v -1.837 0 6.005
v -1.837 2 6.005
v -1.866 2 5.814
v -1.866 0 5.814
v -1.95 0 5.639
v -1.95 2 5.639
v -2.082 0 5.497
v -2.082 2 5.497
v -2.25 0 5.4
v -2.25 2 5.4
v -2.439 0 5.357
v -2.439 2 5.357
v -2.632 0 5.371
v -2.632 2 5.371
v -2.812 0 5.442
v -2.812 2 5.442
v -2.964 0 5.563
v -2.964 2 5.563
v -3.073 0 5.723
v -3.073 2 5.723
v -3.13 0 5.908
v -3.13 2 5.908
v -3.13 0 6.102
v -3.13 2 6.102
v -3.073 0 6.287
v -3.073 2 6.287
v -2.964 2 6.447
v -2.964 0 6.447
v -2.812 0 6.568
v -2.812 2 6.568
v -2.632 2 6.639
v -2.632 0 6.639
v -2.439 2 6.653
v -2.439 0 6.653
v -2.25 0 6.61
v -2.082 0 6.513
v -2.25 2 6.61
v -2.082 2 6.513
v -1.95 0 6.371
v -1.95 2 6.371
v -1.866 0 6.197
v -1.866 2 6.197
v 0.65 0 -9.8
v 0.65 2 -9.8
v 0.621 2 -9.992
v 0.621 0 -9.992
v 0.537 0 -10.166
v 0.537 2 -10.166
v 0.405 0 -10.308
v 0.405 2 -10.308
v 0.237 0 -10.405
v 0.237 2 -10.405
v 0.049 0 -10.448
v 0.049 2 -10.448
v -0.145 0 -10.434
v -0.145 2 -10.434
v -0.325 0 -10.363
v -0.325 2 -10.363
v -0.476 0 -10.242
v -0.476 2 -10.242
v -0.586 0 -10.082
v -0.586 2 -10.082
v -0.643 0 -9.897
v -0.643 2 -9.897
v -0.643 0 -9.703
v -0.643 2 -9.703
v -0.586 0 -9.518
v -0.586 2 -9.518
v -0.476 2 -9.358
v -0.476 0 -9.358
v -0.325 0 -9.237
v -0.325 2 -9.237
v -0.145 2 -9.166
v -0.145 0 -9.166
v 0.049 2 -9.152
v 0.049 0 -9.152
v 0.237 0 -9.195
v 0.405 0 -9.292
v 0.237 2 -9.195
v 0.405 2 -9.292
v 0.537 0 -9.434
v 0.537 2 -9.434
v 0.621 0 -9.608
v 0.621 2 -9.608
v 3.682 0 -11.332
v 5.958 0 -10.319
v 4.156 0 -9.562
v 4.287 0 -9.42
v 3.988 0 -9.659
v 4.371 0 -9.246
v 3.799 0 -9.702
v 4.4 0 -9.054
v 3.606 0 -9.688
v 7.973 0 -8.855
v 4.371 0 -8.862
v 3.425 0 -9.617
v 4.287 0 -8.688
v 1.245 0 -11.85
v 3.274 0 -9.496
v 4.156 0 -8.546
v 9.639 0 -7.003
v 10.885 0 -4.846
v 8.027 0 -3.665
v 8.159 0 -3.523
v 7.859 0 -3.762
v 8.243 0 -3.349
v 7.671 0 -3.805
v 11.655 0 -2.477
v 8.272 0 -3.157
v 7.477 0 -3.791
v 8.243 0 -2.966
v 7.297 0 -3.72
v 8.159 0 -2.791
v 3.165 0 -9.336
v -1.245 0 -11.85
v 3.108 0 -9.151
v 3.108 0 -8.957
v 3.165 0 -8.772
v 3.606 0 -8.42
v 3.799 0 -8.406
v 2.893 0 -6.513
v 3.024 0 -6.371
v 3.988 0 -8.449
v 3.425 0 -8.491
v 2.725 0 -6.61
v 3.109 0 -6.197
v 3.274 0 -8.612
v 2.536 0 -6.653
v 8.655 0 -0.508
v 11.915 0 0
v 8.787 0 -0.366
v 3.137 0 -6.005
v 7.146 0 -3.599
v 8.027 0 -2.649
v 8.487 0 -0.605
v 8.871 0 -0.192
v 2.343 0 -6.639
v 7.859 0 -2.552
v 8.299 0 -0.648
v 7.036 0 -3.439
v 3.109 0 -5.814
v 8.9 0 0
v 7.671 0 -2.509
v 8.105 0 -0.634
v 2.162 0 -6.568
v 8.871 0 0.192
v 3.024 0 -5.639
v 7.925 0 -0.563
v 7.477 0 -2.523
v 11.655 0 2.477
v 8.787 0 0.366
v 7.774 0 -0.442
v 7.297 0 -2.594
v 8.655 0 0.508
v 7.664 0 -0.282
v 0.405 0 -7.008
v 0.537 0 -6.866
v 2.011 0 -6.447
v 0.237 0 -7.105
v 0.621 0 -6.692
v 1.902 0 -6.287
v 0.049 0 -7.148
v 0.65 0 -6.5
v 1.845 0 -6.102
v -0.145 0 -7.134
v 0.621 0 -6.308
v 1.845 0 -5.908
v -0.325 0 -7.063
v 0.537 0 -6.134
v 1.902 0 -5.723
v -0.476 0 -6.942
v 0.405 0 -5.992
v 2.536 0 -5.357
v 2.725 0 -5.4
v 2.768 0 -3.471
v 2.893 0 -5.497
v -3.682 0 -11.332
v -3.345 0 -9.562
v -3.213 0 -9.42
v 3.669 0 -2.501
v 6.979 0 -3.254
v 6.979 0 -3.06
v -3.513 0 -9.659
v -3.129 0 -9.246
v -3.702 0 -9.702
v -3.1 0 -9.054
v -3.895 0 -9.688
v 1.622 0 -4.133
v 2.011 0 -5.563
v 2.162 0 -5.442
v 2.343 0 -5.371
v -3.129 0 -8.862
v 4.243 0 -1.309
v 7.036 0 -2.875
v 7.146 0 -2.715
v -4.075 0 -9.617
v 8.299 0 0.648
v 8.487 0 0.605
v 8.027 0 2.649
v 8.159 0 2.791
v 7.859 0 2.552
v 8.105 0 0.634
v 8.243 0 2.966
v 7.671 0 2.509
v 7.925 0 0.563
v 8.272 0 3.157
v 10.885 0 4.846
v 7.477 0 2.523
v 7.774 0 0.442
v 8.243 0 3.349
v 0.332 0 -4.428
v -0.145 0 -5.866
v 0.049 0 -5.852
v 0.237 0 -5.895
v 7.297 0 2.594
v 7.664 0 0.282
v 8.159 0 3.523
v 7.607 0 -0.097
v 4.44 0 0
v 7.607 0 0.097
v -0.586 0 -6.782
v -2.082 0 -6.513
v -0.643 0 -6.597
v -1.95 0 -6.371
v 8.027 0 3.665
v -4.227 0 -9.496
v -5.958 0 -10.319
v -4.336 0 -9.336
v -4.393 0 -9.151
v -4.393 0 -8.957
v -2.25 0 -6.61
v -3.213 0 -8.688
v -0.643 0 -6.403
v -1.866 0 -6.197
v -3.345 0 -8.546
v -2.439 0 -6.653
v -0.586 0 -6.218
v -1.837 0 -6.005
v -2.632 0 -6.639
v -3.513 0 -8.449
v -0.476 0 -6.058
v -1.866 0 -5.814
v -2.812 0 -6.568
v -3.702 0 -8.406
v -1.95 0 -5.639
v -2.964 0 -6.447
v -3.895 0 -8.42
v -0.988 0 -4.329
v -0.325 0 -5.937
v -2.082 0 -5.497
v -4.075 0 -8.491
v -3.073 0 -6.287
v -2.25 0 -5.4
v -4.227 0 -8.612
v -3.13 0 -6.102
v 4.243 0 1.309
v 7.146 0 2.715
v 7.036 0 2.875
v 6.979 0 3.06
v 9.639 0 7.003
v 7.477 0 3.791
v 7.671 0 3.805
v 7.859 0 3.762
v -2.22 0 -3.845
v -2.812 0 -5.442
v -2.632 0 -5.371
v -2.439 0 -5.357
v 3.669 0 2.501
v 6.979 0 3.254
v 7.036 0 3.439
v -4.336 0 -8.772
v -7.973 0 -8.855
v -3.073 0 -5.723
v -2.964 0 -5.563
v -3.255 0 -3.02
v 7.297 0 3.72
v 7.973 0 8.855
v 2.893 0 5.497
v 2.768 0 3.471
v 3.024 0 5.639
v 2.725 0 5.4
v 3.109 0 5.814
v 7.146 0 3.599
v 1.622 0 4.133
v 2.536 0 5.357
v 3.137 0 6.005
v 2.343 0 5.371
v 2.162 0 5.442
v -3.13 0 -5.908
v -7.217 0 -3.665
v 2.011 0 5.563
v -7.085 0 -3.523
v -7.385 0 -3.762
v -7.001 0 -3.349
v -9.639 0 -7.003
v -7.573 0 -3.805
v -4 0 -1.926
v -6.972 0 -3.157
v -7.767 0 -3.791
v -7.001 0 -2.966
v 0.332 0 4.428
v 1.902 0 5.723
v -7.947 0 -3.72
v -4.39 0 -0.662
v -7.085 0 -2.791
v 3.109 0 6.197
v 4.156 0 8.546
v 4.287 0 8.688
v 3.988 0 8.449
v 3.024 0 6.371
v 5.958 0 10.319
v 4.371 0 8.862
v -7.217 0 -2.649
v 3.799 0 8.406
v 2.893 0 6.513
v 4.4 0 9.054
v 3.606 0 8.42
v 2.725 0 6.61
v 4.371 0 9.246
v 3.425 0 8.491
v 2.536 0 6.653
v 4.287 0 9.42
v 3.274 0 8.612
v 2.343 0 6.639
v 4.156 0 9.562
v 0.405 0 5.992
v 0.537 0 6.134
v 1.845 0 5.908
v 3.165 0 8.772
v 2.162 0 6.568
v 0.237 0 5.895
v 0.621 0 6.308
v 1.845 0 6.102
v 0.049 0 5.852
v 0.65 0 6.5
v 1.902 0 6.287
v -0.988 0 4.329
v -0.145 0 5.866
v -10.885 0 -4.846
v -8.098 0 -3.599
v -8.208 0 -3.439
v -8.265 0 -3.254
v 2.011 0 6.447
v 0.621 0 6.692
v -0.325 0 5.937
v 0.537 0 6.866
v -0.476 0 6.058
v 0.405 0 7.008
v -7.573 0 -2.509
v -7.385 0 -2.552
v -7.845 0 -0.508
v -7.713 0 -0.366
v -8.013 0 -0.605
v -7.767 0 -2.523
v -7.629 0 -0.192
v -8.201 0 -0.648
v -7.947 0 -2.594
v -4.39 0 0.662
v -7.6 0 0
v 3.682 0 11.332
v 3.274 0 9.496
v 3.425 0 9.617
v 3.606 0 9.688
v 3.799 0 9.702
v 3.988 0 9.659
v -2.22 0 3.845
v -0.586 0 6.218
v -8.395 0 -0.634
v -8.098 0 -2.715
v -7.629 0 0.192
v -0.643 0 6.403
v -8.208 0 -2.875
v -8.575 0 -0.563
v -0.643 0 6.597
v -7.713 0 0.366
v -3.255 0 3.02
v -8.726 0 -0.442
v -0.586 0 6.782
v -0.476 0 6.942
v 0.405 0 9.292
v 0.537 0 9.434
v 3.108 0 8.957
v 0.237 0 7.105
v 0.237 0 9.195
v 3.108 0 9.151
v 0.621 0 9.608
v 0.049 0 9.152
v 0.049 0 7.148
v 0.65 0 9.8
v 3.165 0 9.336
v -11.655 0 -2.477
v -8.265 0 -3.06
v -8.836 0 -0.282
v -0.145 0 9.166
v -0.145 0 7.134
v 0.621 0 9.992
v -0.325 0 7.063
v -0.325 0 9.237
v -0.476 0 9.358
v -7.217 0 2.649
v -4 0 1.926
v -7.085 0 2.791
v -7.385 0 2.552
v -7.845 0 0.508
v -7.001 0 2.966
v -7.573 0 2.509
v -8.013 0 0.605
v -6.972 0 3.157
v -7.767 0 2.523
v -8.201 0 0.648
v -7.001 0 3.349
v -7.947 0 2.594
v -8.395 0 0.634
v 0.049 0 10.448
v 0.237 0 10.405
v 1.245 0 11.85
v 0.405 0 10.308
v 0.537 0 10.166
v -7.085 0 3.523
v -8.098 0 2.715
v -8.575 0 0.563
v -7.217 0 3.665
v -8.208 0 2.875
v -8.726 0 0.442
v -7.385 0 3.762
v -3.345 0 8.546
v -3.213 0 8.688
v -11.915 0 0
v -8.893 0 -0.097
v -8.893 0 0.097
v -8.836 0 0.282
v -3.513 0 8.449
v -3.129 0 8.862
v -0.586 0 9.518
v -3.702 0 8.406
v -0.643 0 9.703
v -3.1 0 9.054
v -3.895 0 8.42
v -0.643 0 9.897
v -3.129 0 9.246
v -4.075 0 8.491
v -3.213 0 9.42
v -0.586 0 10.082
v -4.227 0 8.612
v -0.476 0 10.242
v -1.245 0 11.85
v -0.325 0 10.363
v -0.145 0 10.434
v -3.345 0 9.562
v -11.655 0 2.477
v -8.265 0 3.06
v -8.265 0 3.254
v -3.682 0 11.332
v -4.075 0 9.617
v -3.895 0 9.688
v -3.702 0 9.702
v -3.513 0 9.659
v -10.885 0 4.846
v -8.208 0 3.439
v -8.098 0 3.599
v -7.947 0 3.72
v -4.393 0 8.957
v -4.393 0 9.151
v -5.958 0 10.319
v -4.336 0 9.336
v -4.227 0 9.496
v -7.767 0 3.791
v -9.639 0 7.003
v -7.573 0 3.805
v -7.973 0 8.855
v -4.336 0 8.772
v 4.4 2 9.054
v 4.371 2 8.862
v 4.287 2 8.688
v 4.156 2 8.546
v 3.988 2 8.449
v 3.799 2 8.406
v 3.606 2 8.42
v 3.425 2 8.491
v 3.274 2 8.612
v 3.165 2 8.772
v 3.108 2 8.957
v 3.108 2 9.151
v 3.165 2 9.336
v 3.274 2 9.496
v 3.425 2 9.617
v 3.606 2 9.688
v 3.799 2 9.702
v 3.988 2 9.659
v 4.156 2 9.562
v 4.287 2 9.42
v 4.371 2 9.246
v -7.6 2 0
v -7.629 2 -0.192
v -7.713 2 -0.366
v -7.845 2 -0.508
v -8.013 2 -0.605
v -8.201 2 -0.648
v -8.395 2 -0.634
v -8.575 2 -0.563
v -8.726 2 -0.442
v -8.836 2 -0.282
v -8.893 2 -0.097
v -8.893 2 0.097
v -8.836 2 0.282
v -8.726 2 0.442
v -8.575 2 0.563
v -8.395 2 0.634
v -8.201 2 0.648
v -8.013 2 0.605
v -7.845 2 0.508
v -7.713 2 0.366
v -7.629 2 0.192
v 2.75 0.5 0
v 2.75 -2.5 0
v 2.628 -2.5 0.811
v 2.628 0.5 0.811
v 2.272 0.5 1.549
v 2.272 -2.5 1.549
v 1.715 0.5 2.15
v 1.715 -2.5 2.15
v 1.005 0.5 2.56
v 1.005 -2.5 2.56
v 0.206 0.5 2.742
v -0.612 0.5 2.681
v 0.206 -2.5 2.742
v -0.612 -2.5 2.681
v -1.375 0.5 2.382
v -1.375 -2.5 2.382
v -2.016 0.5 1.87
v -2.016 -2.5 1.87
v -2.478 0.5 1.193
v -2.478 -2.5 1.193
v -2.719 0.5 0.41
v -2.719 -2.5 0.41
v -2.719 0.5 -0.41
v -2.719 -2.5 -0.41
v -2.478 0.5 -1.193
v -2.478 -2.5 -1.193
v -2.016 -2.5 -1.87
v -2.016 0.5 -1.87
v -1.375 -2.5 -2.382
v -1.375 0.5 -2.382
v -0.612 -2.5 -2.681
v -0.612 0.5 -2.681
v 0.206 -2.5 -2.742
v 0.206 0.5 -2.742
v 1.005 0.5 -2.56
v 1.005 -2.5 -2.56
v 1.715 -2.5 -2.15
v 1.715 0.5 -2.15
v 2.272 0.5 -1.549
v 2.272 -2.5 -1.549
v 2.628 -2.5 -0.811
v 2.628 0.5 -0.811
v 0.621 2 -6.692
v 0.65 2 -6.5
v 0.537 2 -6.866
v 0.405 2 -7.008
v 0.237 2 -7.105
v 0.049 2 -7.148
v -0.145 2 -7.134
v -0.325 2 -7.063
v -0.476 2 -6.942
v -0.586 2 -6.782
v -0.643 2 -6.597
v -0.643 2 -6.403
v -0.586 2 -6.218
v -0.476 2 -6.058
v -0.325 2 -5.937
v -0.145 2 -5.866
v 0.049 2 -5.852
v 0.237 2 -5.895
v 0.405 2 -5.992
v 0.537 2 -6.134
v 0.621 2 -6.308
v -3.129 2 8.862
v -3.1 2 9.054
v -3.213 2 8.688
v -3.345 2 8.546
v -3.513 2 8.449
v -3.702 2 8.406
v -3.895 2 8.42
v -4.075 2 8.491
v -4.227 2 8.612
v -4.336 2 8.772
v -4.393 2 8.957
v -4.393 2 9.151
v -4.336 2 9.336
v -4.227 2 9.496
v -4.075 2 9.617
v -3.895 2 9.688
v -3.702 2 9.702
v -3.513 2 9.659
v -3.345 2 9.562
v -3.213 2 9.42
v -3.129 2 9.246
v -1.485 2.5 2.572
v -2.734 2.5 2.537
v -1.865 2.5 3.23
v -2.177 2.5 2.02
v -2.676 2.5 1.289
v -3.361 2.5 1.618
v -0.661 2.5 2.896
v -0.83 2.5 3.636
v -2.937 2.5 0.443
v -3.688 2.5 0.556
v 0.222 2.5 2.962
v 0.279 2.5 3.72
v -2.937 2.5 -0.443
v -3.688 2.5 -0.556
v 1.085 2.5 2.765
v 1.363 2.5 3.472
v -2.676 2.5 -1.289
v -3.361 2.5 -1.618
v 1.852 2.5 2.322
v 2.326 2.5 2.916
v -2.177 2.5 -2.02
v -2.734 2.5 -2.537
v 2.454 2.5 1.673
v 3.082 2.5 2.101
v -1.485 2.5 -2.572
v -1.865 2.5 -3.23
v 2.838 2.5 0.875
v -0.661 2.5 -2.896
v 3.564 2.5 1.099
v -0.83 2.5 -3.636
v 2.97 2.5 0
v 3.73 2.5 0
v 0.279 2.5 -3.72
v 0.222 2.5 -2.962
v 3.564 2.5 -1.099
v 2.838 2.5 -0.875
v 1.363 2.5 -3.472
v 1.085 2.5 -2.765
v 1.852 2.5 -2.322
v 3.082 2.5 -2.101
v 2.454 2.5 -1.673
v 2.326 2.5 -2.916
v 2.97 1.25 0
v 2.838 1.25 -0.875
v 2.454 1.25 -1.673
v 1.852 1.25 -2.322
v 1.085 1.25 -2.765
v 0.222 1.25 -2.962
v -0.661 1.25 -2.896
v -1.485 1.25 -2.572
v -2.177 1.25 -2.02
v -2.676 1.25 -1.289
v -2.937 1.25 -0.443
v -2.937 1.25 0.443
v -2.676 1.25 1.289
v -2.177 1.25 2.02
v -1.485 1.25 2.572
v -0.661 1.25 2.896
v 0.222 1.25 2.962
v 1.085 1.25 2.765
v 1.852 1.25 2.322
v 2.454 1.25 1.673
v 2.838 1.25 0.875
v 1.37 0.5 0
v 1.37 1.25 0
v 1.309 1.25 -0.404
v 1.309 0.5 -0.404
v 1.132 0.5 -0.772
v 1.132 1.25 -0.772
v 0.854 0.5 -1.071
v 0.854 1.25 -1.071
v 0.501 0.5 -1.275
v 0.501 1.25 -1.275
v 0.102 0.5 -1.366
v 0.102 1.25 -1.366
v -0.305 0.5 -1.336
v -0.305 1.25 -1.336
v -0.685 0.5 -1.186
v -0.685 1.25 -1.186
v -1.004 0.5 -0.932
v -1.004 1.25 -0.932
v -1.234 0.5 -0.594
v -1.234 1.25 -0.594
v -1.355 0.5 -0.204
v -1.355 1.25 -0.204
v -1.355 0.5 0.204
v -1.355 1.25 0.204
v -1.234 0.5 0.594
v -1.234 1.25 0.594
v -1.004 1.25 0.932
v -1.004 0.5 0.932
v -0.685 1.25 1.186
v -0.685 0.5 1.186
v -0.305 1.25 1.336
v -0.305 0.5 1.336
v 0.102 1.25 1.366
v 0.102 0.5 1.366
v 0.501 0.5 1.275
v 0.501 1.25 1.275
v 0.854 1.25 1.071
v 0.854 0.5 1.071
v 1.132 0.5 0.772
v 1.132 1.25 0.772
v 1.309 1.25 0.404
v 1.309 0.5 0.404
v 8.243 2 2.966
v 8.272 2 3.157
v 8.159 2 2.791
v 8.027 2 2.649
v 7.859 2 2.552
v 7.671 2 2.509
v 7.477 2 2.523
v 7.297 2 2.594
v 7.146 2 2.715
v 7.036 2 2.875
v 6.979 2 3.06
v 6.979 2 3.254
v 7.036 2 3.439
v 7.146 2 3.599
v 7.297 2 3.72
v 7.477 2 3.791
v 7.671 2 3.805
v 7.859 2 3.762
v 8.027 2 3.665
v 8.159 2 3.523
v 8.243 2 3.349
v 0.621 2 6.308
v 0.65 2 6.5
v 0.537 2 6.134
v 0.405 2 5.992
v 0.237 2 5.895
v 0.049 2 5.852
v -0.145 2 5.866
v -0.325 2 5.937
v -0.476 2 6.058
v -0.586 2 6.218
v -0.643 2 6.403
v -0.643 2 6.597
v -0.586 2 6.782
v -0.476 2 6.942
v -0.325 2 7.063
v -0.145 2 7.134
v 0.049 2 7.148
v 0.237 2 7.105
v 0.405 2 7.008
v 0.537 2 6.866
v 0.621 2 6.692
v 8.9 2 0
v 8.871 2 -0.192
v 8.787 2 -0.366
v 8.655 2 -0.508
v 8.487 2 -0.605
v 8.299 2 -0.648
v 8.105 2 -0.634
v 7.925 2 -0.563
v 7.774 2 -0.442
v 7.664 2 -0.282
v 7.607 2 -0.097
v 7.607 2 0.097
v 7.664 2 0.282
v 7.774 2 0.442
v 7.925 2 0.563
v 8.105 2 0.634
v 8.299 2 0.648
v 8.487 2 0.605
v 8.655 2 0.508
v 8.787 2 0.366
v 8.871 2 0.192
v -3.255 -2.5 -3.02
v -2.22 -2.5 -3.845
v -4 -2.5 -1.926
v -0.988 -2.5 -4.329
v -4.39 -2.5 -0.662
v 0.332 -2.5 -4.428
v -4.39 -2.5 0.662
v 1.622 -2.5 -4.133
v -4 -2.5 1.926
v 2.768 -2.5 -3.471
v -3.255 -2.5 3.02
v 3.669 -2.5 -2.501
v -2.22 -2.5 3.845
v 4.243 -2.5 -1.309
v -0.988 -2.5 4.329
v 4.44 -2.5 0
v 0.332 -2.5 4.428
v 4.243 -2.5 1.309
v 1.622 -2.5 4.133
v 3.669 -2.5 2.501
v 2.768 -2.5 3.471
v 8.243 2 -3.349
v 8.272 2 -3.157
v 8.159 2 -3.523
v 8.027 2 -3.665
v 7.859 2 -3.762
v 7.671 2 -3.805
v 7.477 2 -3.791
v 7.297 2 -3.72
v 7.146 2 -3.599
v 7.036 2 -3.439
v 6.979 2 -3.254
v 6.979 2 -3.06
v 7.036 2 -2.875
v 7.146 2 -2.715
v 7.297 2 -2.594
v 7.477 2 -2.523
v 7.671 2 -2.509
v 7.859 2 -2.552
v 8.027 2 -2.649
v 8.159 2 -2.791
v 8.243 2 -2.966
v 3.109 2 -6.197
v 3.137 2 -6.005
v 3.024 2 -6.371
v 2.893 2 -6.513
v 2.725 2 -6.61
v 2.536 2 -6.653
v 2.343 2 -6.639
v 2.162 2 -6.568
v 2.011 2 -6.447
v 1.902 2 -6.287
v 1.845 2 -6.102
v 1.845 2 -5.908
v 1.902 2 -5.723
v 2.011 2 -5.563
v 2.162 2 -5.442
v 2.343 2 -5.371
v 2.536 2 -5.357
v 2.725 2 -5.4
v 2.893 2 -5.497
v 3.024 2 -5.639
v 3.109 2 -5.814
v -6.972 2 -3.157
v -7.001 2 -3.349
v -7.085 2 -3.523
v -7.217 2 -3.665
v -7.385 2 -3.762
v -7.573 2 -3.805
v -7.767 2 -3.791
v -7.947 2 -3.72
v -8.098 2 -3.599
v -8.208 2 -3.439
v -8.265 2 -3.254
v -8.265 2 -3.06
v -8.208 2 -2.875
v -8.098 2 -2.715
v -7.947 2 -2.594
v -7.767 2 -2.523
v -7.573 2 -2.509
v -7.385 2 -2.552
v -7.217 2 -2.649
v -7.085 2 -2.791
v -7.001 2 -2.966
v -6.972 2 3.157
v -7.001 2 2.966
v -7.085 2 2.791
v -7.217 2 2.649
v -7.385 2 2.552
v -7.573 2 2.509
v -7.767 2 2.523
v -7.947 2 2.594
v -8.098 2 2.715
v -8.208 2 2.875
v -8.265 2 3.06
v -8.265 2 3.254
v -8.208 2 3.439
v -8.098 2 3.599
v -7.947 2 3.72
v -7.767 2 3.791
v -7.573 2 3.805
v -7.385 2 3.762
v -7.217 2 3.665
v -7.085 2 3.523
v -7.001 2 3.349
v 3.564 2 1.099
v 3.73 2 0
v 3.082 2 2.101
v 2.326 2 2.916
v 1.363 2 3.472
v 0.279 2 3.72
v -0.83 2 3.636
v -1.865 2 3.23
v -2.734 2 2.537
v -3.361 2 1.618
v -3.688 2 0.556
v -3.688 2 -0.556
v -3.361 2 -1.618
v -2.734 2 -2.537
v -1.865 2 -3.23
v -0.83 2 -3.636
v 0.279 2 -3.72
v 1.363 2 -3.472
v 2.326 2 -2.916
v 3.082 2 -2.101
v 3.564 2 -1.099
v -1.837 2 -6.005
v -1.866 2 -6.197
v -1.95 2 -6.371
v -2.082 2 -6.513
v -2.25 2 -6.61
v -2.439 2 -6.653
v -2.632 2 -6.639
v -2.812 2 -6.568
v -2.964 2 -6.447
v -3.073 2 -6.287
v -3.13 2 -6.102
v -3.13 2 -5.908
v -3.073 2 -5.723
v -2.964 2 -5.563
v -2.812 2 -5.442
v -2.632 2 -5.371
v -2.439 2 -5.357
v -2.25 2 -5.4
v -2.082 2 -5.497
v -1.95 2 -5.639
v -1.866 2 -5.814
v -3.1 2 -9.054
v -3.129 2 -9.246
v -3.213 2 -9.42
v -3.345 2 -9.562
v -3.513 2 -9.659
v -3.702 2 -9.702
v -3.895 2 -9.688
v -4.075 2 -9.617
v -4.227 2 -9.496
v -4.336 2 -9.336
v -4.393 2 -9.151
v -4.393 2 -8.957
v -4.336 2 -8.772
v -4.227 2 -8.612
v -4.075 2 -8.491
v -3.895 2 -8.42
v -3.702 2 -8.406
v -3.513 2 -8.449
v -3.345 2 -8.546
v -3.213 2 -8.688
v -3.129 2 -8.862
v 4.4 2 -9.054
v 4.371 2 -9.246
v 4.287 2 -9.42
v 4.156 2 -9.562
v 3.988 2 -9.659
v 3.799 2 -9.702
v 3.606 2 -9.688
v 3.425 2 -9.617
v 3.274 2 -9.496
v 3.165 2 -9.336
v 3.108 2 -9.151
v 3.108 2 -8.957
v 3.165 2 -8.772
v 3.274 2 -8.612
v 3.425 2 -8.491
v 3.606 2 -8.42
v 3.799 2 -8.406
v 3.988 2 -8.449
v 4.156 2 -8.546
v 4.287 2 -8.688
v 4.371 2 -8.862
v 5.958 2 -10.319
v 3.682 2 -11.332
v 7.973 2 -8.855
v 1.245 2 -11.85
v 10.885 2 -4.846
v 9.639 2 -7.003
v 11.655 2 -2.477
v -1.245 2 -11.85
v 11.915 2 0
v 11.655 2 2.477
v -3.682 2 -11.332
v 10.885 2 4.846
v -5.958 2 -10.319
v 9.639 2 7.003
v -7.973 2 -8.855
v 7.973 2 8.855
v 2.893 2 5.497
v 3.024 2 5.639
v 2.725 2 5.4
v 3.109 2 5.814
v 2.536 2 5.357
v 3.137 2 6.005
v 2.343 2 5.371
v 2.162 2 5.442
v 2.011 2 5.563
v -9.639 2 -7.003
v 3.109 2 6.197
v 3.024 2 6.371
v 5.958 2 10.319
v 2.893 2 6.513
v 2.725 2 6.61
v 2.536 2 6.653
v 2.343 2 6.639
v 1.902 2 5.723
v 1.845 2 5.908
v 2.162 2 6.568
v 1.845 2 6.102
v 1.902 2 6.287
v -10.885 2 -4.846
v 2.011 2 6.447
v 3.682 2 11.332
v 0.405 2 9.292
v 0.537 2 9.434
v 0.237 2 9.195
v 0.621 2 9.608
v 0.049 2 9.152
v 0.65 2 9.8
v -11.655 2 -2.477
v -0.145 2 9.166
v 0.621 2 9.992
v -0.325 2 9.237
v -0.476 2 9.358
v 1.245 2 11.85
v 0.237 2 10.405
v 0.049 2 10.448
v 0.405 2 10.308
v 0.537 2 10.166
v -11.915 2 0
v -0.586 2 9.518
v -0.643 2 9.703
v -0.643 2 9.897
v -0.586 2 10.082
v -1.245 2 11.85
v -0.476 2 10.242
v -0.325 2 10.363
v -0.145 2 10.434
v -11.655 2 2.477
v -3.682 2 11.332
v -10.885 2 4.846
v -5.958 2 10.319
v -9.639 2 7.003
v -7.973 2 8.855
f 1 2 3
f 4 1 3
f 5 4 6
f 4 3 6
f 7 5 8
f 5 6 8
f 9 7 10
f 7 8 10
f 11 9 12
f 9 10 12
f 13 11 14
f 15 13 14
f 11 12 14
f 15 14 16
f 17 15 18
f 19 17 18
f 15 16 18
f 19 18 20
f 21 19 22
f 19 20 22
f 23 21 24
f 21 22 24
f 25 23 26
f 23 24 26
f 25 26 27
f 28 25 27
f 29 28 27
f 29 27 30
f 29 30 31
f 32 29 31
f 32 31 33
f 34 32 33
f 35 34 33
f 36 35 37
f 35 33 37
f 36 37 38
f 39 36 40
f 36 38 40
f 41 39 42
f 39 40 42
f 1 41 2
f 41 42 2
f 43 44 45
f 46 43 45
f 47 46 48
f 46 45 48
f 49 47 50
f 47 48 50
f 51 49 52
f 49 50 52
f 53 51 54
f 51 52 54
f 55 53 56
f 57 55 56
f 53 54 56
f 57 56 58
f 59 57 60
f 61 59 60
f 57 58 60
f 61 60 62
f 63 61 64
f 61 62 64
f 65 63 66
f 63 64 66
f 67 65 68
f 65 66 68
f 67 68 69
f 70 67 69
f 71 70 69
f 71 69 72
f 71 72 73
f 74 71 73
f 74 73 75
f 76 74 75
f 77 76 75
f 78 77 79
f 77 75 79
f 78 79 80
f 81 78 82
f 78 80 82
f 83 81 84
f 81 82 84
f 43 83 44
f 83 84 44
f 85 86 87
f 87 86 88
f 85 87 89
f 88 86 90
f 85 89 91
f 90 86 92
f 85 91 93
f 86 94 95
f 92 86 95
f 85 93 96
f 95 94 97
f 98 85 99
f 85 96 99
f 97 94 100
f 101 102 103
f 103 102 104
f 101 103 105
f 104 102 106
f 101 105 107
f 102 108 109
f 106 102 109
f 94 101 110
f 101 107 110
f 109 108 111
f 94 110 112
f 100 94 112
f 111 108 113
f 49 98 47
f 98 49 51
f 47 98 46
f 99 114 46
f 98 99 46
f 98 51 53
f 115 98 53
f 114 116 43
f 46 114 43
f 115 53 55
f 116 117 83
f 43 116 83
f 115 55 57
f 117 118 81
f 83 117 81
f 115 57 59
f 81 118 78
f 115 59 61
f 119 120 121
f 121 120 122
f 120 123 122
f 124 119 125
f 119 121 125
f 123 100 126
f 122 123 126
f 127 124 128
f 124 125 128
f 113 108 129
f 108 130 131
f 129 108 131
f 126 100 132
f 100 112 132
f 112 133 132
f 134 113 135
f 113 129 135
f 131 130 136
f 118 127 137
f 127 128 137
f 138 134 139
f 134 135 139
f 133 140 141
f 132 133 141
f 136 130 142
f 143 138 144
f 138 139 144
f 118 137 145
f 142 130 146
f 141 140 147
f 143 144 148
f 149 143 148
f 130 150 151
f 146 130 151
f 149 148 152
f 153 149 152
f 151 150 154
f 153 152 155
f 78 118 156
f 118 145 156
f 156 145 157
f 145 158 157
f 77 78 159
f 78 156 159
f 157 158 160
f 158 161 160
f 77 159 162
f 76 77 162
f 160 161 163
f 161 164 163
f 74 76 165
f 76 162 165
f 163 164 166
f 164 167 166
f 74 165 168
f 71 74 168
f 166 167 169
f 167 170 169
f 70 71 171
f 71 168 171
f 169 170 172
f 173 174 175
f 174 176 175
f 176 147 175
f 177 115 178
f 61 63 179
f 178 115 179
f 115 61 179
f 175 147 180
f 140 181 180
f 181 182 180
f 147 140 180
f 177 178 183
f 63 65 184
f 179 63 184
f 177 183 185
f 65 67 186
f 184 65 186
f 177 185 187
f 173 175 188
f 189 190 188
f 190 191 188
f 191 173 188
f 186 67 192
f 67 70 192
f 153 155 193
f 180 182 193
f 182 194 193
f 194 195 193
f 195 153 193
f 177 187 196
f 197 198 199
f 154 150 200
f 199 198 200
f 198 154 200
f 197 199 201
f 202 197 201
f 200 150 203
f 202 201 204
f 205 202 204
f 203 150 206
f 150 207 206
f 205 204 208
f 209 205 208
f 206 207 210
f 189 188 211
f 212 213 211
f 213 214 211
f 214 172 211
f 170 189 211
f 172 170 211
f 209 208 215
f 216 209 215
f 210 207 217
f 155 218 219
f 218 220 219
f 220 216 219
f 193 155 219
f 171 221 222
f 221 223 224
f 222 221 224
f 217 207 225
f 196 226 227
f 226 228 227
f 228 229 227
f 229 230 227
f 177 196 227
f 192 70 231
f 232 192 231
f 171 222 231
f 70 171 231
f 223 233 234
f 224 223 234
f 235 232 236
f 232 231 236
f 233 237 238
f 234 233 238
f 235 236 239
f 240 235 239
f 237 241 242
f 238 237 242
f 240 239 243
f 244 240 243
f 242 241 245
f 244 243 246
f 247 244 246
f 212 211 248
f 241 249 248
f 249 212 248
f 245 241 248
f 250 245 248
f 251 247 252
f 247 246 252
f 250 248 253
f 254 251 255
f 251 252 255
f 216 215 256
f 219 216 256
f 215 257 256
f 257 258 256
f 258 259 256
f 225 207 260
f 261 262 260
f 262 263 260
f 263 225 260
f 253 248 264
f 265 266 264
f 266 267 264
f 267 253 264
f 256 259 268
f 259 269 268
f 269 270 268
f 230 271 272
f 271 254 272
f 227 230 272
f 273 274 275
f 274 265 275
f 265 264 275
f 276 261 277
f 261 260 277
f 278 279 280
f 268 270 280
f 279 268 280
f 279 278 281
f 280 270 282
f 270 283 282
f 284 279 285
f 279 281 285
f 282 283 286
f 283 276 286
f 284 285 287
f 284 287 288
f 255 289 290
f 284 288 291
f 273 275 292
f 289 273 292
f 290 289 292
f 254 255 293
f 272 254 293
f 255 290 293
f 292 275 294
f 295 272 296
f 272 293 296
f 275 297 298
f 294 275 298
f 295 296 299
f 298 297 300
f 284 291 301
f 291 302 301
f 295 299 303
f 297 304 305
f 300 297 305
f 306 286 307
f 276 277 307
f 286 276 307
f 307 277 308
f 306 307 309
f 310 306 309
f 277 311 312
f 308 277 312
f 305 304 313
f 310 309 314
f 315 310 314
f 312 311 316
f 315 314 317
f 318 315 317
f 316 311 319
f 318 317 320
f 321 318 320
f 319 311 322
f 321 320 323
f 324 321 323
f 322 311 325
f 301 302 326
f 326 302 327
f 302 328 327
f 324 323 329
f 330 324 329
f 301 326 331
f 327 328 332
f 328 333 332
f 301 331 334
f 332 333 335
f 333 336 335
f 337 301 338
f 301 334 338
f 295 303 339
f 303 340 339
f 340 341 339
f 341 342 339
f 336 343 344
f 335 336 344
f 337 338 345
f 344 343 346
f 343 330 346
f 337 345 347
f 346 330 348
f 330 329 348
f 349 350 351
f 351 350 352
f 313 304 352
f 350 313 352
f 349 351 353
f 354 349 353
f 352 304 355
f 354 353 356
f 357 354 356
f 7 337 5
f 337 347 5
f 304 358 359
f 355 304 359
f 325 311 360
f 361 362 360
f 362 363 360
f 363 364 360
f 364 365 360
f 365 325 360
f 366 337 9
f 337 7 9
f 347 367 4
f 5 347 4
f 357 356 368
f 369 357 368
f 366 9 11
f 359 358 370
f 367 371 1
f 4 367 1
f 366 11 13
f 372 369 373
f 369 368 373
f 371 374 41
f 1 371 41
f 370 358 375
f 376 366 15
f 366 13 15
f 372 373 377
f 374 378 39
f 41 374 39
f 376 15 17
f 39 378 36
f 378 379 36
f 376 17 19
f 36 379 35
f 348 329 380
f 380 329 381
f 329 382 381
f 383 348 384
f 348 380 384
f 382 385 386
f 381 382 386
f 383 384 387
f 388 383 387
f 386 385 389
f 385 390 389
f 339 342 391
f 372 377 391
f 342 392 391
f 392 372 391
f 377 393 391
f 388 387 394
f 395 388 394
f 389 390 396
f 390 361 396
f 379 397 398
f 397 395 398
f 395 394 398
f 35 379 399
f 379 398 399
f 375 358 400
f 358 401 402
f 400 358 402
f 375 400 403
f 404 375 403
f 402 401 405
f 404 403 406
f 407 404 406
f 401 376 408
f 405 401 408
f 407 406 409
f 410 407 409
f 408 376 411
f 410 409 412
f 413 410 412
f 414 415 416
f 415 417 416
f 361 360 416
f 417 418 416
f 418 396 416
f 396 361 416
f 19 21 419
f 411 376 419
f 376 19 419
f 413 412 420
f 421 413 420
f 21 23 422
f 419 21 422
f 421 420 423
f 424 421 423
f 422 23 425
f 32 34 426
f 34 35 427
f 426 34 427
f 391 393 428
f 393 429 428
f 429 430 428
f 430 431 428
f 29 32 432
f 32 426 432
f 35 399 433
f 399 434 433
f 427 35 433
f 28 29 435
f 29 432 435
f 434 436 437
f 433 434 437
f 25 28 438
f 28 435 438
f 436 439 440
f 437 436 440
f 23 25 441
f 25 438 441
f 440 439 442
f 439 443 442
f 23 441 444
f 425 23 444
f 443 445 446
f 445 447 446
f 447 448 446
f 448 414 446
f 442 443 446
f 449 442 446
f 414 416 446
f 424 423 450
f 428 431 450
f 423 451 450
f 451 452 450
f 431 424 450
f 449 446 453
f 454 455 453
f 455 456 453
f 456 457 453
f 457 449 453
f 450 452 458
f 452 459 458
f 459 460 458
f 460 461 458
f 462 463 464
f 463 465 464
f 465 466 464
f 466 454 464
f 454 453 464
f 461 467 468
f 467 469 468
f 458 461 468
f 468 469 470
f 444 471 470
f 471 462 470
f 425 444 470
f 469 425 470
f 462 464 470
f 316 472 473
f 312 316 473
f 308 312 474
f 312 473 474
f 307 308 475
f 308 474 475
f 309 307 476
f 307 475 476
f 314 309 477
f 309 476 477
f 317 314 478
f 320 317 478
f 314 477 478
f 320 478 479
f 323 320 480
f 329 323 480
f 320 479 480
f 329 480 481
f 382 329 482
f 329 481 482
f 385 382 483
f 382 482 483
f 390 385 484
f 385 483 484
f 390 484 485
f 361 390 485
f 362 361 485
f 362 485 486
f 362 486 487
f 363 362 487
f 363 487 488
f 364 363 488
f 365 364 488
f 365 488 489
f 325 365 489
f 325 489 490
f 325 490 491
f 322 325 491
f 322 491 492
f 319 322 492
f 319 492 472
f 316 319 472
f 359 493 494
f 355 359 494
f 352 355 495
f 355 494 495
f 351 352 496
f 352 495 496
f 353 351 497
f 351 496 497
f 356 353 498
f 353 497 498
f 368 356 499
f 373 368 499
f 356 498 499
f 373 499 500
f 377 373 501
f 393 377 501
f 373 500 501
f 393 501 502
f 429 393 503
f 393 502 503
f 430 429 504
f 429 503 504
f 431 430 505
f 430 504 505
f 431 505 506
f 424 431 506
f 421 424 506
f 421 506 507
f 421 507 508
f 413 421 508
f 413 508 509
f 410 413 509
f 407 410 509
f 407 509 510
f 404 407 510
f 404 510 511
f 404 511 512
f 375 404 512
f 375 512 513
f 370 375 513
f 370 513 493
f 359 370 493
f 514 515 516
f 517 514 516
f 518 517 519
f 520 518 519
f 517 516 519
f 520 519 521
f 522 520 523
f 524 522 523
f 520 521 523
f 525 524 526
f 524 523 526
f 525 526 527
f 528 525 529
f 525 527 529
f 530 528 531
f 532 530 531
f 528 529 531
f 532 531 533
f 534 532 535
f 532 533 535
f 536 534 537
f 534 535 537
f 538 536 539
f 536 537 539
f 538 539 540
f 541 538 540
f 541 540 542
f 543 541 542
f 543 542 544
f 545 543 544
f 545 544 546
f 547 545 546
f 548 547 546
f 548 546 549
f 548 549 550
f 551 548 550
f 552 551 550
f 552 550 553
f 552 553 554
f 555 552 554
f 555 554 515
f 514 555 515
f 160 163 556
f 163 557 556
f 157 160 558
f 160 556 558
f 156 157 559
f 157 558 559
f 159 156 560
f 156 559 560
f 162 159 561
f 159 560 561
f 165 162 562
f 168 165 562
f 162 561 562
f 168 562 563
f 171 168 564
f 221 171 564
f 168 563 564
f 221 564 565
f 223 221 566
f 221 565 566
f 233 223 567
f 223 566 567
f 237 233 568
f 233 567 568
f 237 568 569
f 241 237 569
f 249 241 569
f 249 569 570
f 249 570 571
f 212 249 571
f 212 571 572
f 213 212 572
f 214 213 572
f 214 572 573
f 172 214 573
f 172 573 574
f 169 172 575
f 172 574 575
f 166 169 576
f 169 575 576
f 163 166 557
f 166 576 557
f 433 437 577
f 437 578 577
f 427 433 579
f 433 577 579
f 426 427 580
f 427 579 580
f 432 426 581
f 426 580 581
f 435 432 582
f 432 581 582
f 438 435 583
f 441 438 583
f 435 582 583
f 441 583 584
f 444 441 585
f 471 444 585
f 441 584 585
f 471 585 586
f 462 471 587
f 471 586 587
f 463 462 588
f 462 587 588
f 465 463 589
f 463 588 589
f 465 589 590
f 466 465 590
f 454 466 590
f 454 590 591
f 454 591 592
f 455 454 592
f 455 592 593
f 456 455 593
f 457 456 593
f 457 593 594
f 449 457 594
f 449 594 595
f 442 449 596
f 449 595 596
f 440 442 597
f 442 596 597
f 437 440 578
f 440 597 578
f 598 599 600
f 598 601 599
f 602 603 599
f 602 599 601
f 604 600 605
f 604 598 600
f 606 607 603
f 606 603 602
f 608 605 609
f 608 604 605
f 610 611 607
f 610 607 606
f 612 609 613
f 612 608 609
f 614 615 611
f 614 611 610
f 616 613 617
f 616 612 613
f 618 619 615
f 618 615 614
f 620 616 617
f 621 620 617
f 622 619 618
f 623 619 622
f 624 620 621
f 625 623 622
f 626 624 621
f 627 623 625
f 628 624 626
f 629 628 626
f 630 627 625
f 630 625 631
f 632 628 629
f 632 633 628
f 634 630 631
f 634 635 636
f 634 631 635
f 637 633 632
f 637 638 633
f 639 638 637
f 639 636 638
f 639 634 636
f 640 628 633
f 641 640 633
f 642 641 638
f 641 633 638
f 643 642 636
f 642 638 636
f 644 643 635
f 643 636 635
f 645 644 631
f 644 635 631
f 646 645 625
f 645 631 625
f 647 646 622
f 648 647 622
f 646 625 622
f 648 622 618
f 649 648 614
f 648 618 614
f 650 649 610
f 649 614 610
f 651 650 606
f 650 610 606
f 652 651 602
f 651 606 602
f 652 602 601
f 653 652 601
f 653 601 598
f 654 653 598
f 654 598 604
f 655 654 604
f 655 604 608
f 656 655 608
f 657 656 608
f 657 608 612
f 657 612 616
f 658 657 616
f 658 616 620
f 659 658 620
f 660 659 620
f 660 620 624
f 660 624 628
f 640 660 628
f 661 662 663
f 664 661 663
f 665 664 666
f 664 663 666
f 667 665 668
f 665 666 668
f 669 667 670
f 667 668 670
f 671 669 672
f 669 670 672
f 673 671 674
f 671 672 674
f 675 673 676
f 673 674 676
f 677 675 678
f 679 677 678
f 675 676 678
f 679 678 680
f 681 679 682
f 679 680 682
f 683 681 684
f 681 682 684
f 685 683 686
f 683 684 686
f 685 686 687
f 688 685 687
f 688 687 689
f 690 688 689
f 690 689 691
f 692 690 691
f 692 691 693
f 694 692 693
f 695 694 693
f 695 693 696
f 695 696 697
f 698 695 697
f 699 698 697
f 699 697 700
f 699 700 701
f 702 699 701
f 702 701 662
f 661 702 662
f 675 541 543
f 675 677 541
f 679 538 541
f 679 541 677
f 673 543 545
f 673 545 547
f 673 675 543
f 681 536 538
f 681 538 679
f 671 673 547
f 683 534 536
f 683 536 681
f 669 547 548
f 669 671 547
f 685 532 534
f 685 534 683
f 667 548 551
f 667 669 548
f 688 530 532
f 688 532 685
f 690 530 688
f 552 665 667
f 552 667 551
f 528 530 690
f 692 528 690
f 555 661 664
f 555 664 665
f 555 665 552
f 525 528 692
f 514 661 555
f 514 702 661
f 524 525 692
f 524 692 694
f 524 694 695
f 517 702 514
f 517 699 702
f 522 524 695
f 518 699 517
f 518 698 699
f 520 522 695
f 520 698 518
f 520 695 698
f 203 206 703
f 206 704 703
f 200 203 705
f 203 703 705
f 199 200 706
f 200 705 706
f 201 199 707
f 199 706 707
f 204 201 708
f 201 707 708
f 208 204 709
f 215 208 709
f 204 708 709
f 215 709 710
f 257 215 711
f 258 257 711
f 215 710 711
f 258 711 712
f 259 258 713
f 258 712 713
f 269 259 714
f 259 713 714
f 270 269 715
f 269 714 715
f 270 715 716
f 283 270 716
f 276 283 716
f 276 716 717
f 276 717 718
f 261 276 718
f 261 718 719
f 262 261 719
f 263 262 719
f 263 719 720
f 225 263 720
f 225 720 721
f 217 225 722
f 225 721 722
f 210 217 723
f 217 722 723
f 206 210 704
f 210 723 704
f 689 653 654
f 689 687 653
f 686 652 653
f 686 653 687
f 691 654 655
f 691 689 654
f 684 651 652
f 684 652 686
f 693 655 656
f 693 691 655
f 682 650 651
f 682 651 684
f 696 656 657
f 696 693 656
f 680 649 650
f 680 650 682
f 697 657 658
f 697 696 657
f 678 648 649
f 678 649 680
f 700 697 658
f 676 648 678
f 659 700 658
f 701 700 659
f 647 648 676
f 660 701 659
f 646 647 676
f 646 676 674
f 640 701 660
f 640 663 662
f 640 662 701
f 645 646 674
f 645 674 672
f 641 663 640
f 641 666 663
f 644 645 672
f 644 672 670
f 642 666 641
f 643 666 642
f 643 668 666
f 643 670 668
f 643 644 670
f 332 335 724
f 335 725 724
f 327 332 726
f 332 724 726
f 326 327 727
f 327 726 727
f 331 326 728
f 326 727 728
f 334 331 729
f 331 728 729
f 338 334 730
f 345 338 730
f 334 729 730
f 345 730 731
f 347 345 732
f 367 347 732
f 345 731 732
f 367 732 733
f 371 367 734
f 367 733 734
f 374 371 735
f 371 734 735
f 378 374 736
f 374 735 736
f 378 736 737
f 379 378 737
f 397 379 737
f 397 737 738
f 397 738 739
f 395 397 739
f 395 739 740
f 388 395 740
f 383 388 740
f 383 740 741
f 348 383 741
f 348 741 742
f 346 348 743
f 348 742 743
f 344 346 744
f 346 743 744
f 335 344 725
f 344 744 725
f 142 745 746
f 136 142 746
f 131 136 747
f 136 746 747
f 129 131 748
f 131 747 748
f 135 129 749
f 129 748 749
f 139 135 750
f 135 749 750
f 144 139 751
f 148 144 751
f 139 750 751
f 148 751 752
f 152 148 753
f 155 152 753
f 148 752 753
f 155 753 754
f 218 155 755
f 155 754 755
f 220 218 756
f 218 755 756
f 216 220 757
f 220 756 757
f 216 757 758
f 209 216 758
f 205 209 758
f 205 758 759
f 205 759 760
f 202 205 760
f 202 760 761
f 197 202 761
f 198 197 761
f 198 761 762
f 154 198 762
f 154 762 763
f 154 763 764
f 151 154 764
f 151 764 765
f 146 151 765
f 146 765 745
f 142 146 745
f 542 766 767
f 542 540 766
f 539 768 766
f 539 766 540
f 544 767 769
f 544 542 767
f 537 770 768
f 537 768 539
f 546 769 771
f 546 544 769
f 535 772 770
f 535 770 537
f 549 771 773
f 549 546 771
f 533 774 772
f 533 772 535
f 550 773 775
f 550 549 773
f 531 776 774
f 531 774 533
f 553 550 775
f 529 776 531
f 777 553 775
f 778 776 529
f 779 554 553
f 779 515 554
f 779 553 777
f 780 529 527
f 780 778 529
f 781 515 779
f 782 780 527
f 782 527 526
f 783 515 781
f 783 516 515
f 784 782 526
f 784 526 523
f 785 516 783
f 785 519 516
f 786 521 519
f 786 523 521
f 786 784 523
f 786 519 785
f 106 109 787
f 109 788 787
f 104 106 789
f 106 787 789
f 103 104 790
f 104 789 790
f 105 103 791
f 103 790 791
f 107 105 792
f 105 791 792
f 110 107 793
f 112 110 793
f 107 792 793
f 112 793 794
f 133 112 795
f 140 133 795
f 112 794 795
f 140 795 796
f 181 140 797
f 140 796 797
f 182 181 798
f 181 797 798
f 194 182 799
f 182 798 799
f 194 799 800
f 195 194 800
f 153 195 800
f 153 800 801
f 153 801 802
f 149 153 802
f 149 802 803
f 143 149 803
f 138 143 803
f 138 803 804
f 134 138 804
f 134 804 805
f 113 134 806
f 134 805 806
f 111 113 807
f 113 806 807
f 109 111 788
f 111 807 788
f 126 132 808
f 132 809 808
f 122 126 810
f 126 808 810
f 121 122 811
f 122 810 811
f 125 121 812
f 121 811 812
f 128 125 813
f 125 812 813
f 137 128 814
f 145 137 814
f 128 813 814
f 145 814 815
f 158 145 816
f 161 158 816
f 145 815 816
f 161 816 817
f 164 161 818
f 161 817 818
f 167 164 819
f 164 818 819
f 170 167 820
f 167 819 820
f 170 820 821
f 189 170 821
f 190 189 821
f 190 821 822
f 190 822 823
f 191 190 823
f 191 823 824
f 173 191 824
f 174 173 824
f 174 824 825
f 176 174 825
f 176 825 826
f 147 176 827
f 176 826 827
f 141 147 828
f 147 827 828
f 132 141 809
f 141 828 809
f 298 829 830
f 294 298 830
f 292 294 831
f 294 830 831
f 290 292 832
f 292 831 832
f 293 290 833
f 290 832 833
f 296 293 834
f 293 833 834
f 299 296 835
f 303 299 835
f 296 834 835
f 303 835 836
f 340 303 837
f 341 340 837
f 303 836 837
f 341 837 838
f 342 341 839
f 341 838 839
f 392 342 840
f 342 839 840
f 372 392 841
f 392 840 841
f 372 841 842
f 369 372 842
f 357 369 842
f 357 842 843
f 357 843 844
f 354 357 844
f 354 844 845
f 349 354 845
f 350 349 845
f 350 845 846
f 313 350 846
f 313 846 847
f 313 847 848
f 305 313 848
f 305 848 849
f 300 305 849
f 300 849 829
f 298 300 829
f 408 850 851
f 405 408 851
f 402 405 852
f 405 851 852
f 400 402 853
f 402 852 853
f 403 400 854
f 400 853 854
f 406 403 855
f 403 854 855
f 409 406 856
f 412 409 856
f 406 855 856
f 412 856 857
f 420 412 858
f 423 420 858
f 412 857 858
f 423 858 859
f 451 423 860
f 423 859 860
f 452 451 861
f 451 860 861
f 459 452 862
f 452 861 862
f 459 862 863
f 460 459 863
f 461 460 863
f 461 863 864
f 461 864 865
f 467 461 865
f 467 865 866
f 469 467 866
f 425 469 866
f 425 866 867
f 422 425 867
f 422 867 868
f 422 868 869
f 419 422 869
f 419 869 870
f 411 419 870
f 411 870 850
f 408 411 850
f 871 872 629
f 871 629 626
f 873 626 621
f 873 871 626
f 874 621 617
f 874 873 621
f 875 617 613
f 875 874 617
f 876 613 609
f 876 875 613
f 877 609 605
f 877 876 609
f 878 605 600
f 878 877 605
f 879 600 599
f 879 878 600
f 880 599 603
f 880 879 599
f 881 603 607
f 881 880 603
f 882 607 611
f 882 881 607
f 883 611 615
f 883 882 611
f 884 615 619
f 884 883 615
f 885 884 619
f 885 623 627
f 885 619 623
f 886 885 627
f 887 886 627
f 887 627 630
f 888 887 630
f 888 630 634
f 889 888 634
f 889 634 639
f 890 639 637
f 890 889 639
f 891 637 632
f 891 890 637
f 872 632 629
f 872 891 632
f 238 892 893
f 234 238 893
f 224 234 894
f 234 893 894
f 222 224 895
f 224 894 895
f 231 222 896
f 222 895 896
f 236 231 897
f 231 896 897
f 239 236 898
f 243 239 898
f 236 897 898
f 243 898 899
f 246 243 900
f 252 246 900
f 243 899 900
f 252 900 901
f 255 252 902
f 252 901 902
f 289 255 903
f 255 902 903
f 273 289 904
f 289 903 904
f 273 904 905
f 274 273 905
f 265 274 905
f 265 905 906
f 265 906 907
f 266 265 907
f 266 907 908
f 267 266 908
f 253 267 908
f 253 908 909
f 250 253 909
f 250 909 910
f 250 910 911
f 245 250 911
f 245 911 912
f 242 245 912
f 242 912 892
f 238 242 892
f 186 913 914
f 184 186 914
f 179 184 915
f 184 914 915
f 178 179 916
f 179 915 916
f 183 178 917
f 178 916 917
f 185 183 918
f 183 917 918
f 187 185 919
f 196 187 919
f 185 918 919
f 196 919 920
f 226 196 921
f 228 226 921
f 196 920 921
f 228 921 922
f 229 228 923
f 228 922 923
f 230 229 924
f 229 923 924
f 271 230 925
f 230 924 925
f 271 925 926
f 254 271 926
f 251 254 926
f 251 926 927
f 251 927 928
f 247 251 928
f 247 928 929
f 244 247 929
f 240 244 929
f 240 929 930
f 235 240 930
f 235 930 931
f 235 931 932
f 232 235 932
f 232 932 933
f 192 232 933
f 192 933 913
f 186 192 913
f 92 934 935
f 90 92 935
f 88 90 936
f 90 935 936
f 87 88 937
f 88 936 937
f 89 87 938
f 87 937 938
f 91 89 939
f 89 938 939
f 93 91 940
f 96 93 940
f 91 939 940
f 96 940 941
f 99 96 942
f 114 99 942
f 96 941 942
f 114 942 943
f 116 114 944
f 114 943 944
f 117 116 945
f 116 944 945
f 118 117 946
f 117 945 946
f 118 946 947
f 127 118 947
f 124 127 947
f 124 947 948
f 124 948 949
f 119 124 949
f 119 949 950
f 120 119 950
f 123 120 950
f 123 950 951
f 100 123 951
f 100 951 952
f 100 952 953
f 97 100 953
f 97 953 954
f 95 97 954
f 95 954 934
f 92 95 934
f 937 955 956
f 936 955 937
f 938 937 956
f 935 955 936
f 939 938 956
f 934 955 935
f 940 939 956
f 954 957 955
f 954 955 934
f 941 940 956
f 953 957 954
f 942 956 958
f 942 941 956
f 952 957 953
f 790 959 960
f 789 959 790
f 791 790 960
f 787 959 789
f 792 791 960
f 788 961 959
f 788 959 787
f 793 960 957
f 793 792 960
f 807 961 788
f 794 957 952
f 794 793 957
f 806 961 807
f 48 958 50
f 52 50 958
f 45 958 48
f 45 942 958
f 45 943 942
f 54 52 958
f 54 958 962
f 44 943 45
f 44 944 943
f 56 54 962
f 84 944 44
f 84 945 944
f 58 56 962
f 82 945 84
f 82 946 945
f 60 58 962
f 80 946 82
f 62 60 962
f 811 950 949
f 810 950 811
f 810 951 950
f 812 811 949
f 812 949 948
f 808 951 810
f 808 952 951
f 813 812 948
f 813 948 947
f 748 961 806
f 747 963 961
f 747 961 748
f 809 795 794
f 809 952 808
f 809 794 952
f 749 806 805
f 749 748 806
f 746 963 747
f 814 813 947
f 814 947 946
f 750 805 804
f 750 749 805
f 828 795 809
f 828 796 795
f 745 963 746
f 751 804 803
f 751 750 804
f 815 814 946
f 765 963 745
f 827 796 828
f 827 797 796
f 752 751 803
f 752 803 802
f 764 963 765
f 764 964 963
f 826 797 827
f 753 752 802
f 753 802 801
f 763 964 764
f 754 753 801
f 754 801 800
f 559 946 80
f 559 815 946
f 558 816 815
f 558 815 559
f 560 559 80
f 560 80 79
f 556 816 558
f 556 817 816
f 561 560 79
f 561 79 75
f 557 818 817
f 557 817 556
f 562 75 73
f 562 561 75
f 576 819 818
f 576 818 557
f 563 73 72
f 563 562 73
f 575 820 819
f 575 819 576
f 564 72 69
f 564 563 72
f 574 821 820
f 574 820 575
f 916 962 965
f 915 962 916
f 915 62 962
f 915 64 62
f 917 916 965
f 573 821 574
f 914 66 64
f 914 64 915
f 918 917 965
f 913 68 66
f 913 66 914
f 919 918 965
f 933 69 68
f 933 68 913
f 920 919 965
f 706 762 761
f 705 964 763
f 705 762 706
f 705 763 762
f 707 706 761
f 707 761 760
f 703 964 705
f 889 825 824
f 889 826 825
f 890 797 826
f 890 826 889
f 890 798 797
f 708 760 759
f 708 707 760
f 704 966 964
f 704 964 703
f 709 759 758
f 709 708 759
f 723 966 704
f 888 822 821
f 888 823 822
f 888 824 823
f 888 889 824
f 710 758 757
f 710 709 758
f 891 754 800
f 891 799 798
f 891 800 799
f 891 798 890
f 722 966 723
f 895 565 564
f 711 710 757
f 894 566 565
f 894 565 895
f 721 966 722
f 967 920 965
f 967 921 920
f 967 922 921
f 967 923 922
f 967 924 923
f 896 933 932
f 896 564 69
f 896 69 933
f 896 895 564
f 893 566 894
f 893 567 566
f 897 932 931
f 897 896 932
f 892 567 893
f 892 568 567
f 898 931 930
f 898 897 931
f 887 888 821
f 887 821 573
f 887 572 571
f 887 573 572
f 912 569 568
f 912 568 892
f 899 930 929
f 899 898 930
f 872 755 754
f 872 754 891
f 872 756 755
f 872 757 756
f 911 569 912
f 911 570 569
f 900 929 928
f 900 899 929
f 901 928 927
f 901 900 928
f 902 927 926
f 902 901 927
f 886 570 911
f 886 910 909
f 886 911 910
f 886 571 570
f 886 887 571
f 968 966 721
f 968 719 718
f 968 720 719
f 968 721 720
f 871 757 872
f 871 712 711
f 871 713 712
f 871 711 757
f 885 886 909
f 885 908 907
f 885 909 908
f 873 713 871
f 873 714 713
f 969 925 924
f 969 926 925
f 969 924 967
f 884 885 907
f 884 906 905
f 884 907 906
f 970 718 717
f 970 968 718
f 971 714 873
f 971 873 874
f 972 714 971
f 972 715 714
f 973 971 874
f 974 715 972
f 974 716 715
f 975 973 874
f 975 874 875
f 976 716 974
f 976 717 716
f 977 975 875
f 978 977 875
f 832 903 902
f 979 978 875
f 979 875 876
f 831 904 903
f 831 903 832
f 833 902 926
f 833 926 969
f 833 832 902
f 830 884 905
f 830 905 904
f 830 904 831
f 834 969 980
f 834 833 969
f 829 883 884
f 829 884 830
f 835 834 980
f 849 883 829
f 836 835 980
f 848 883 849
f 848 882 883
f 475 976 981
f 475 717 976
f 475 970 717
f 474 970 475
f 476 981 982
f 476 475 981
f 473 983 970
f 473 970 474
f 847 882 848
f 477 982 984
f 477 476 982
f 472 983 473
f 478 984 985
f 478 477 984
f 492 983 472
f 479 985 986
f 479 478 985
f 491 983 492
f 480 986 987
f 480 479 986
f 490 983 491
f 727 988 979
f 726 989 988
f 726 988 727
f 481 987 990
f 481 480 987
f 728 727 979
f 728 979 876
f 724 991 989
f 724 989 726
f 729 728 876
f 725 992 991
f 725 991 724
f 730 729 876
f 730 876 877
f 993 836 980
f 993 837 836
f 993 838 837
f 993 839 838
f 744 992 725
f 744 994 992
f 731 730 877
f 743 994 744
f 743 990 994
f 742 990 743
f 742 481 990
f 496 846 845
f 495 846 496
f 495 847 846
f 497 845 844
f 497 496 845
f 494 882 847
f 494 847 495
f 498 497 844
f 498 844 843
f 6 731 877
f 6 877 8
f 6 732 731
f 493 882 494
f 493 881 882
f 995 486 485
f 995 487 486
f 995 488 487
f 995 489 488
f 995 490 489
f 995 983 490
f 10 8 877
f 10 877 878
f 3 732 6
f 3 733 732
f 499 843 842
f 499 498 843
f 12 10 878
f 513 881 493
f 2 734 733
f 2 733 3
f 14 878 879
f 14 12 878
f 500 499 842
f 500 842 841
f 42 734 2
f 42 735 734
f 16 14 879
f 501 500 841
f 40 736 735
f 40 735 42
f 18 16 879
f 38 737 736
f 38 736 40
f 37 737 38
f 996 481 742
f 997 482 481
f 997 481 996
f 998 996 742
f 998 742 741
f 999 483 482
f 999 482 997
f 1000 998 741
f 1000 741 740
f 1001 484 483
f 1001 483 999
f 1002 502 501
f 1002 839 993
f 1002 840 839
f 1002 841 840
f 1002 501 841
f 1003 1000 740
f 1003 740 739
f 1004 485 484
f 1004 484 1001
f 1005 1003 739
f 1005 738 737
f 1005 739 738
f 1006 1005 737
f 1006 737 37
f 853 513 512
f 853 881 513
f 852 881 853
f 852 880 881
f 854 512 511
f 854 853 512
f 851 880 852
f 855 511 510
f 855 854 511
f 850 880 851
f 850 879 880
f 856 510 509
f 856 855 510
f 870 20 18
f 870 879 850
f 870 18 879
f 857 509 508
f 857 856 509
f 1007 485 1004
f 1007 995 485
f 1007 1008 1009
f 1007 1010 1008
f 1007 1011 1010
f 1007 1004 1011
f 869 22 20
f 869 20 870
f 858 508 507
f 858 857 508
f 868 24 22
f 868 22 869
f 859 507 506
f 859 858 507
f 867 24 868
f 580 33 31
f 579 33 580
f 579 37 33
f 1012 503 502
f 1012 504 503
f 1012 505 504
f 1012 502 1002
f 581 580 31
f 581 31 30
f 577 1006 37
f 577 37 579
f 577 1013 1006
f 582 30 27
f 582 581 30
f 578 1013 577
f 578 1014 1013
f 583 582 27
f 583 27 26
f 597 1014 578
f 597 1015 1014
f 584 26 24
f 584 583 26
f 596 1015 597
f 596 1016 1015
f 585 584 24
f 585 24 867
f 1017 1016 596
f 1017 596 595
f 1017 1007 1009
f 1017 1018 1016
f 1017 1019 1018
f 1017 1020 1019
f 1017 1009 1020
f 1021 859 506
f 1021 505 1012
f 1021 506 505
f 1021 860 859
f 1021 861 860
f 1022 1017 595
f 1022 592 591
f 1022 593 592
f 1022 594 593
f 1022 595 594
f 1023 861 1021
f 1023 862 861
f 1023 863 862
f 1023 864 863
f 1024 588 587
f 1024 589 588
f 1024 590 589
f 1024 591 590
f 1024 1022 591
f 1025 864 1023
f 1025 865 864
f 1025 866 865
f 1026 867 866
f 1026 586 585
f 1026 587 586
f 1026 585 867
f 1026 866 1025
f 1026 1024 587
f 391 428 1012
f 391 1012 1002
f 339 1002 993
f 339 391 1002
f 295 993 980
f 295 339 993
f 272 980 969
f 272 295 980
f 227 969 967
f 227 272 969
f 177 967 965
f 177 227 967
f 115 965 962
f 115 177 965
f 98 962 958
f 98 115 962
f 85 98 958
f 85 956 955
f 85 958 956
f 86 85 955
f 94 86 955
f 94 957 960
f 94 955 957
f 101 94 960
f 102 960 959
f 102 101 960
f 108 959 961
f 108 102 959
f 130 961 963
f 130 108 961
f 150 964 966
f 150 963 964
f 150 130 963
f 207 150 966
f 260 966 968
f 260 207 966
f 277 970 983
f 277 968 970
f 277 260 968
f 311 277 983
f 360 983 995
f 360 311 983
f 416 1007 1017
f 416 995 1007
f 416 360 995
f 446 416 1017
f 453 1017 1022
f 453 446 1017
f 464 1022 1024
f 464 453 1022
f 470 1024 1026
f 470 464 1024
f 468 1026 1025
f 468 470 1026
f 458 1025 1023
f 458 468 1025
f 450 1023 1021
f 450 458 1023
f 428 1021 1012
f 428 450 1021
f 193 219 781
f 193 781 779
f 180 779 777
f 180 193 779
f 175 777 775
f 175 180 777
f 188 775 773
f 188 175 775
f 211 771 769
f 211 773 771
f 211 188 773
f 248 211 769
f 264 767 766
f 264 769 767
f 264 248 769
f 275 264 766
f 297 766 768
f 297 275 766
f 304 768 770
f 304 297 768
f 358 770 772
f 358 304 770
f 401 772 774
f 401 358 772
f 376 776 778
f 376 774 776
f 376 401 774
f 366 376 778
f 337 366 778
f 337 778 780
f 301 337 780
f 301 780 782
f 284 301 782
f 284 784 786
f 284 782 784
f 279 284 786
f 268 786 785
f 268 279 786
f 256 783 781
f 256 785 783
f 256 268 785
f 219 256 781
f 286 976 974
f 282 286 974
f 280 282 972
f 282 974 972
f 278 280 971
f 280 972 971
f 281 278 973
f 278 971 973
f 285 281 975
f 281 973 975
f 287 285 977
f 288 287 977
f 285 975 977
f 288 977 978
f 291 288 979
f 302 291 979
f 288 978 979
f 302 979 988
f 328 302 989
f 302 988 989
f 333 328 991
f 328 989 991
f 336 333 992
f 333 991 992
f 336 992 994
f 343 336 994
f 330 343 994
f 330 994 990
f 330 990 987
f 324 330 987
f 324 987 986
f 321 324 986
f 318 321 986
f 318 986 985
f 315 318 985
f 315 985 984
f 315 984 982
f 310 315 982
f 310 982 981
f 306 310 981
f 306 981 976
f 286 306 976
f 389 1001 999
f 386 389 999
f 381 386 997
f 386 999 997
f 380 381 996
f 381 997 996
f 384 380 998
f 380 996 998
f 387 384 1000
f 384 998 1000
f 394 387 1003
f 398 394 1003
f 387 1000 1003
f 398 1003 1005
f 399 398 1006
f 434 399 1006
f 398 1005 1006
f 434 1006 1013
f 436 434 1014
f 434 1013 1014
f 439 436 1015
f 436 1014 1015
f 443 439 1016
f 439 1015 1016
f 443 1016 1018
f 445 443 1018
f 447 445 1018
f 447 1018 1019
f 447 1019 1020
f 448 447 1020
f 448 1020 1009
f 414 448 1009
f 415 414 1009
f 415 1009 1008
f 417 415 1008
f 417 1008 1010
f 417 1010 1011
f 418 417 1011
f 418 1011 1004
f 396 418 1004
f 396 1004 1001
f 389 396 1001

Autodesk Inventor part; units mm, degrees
ref_plane "YZ Plane" through (0, 0, 0) normal (1, 0, 0) x (0, 1, 0)
ref_plane "XZ Plane" through (0, 0, 0) normal (0, 1, 0) x (-1, 0, 0)
ref_plane "XY Plane" through (0, 0, 0) normal (0, 0, 1) x (1, 0, 0)
sketch "Sketch1" plane through (0, 0, 0) normal (0, 1, 0) x (-1, 0, 0)
  circle A0 centre (0, 0) radius 11.915
  dimension "d0" = 23.83
extrude "Extrusion1" add sketch "Sketch1" along normal blind 2
sketch "Sketch2" plane through (0, 2, 0) normal (0, 1, 0) x (1, 0, 0)
  circle A0 centre (0, 6.5) radius 0.65
  line L0 (0, 0) -> (6.5, 0) construction
  circle A1 centre (2.4874, 6.0052) radius 0.65
  circle A2 centre (8.25, 0) radius 0.65
  line L1 (0, 0) -> (8.25, 0) construction
  circle A3 centre (7.622, 3.1571) radius 0.65
  circle A4 centre (0, 9.8) radius 0.65
  line L2 (0, 0) -> (9.8, 0) construction
  circle A5 centre (3.7503, 9.054) radius 0.65
  circle A6 centre (0, 0) radius 11.915 projected
  circle A7 centre (-2.4874, 6.0052) radius 0.65
  circle A8 centre (-8.25, 0) radius 0.65
  circle A9 centre (-7.622, 3.1571) radius 0.65
  circle A10 centre (-3.7503, 9.054) radius 0.65
  circle A11 centre (0, -6.5) radius 0.65
  circle A12 centre (2.4874, -6.0052) radius 0.65
  circle A13 centre (7.622, -3.1571) radius 0.65
  circle A14 centre (0, -9.8) radius 0.65
  circle A15 centre (3.7503, -9.054) radius 0.65
  circle A16 centre (-3.7503, -9.054) radius 0.65
  circle A17 centre (-2.4874, -6.0052) radius 0.65
  circle A18 centre (-7.622, -3.1571) radius 0.65
  dimension "d5" = 1.3
  dimension "d8" = 1.3
  dimension "d10" = 1.3
  dimension "d13" = 1.3
  dimension "d15" = 1.3
  dimension "d18" = 1.3
extrude "Extrusion2" cut sketch "Sketch2" against normal blind 2 contours A0 | A1 | A2 | A3 | A4 | A5 | A7 | A8 | A9 | A10 | A11 | A12 | A13 | A14 | A15 | A16 | A17 | A18
sketch "Sketch3" plane through (0, 2, 0) normal (0, 1, 0) x (1, 0, 0)
  circle A0 centre (0, 0) radius 3.73
  dimension "d21" = 7.46
extrude "Extrusion3" add sketch "Sketch3" along normal blind 0.5
sketch "Sketch4" plane through (0, 2.5, 0) normal (0, 1, 0) x (1, 0, 0)
  circle A0 centre (0, 0) radius 2.97
  dimension "d24" = 5.94
extrude "Extrusion4" cut sketch "Sketch4" against normal blind 1.25
sketch "Sketch5" plane through (0, 1.25, 0) normal (0, 1, 0) x (1, 0, 0)
  circle A0 centre (0, 0) radius 1.37
  dimension "d27" = 2.74
extrude "Extrusion5" cut sketch "Sketch5" against normal blind 0.75
sketch "Sketch6" plane through (0, 0, 0) normal (0, -1, 0) x (1, 0, 0)
  circle A0 centre (0, 0) radius 4.44
  dimension "d30" = 8.88
extrude "Extrusion6" add sketch "Sketch6" along normal blind 2.5
sketch "Sketch7" plane through (0, -2.5, 0) normal (0, -1, 0) x (1, 0, 0)
  circle A0 centre (0, 0) radius 2.75
  dimension "d33" = 5.5
extrude "Extrusion7" cut sketch "Sketch7" against normal blind 3
properties part number "MMAE 232 Assignment 2_White Circle - Dylan Tamras"
